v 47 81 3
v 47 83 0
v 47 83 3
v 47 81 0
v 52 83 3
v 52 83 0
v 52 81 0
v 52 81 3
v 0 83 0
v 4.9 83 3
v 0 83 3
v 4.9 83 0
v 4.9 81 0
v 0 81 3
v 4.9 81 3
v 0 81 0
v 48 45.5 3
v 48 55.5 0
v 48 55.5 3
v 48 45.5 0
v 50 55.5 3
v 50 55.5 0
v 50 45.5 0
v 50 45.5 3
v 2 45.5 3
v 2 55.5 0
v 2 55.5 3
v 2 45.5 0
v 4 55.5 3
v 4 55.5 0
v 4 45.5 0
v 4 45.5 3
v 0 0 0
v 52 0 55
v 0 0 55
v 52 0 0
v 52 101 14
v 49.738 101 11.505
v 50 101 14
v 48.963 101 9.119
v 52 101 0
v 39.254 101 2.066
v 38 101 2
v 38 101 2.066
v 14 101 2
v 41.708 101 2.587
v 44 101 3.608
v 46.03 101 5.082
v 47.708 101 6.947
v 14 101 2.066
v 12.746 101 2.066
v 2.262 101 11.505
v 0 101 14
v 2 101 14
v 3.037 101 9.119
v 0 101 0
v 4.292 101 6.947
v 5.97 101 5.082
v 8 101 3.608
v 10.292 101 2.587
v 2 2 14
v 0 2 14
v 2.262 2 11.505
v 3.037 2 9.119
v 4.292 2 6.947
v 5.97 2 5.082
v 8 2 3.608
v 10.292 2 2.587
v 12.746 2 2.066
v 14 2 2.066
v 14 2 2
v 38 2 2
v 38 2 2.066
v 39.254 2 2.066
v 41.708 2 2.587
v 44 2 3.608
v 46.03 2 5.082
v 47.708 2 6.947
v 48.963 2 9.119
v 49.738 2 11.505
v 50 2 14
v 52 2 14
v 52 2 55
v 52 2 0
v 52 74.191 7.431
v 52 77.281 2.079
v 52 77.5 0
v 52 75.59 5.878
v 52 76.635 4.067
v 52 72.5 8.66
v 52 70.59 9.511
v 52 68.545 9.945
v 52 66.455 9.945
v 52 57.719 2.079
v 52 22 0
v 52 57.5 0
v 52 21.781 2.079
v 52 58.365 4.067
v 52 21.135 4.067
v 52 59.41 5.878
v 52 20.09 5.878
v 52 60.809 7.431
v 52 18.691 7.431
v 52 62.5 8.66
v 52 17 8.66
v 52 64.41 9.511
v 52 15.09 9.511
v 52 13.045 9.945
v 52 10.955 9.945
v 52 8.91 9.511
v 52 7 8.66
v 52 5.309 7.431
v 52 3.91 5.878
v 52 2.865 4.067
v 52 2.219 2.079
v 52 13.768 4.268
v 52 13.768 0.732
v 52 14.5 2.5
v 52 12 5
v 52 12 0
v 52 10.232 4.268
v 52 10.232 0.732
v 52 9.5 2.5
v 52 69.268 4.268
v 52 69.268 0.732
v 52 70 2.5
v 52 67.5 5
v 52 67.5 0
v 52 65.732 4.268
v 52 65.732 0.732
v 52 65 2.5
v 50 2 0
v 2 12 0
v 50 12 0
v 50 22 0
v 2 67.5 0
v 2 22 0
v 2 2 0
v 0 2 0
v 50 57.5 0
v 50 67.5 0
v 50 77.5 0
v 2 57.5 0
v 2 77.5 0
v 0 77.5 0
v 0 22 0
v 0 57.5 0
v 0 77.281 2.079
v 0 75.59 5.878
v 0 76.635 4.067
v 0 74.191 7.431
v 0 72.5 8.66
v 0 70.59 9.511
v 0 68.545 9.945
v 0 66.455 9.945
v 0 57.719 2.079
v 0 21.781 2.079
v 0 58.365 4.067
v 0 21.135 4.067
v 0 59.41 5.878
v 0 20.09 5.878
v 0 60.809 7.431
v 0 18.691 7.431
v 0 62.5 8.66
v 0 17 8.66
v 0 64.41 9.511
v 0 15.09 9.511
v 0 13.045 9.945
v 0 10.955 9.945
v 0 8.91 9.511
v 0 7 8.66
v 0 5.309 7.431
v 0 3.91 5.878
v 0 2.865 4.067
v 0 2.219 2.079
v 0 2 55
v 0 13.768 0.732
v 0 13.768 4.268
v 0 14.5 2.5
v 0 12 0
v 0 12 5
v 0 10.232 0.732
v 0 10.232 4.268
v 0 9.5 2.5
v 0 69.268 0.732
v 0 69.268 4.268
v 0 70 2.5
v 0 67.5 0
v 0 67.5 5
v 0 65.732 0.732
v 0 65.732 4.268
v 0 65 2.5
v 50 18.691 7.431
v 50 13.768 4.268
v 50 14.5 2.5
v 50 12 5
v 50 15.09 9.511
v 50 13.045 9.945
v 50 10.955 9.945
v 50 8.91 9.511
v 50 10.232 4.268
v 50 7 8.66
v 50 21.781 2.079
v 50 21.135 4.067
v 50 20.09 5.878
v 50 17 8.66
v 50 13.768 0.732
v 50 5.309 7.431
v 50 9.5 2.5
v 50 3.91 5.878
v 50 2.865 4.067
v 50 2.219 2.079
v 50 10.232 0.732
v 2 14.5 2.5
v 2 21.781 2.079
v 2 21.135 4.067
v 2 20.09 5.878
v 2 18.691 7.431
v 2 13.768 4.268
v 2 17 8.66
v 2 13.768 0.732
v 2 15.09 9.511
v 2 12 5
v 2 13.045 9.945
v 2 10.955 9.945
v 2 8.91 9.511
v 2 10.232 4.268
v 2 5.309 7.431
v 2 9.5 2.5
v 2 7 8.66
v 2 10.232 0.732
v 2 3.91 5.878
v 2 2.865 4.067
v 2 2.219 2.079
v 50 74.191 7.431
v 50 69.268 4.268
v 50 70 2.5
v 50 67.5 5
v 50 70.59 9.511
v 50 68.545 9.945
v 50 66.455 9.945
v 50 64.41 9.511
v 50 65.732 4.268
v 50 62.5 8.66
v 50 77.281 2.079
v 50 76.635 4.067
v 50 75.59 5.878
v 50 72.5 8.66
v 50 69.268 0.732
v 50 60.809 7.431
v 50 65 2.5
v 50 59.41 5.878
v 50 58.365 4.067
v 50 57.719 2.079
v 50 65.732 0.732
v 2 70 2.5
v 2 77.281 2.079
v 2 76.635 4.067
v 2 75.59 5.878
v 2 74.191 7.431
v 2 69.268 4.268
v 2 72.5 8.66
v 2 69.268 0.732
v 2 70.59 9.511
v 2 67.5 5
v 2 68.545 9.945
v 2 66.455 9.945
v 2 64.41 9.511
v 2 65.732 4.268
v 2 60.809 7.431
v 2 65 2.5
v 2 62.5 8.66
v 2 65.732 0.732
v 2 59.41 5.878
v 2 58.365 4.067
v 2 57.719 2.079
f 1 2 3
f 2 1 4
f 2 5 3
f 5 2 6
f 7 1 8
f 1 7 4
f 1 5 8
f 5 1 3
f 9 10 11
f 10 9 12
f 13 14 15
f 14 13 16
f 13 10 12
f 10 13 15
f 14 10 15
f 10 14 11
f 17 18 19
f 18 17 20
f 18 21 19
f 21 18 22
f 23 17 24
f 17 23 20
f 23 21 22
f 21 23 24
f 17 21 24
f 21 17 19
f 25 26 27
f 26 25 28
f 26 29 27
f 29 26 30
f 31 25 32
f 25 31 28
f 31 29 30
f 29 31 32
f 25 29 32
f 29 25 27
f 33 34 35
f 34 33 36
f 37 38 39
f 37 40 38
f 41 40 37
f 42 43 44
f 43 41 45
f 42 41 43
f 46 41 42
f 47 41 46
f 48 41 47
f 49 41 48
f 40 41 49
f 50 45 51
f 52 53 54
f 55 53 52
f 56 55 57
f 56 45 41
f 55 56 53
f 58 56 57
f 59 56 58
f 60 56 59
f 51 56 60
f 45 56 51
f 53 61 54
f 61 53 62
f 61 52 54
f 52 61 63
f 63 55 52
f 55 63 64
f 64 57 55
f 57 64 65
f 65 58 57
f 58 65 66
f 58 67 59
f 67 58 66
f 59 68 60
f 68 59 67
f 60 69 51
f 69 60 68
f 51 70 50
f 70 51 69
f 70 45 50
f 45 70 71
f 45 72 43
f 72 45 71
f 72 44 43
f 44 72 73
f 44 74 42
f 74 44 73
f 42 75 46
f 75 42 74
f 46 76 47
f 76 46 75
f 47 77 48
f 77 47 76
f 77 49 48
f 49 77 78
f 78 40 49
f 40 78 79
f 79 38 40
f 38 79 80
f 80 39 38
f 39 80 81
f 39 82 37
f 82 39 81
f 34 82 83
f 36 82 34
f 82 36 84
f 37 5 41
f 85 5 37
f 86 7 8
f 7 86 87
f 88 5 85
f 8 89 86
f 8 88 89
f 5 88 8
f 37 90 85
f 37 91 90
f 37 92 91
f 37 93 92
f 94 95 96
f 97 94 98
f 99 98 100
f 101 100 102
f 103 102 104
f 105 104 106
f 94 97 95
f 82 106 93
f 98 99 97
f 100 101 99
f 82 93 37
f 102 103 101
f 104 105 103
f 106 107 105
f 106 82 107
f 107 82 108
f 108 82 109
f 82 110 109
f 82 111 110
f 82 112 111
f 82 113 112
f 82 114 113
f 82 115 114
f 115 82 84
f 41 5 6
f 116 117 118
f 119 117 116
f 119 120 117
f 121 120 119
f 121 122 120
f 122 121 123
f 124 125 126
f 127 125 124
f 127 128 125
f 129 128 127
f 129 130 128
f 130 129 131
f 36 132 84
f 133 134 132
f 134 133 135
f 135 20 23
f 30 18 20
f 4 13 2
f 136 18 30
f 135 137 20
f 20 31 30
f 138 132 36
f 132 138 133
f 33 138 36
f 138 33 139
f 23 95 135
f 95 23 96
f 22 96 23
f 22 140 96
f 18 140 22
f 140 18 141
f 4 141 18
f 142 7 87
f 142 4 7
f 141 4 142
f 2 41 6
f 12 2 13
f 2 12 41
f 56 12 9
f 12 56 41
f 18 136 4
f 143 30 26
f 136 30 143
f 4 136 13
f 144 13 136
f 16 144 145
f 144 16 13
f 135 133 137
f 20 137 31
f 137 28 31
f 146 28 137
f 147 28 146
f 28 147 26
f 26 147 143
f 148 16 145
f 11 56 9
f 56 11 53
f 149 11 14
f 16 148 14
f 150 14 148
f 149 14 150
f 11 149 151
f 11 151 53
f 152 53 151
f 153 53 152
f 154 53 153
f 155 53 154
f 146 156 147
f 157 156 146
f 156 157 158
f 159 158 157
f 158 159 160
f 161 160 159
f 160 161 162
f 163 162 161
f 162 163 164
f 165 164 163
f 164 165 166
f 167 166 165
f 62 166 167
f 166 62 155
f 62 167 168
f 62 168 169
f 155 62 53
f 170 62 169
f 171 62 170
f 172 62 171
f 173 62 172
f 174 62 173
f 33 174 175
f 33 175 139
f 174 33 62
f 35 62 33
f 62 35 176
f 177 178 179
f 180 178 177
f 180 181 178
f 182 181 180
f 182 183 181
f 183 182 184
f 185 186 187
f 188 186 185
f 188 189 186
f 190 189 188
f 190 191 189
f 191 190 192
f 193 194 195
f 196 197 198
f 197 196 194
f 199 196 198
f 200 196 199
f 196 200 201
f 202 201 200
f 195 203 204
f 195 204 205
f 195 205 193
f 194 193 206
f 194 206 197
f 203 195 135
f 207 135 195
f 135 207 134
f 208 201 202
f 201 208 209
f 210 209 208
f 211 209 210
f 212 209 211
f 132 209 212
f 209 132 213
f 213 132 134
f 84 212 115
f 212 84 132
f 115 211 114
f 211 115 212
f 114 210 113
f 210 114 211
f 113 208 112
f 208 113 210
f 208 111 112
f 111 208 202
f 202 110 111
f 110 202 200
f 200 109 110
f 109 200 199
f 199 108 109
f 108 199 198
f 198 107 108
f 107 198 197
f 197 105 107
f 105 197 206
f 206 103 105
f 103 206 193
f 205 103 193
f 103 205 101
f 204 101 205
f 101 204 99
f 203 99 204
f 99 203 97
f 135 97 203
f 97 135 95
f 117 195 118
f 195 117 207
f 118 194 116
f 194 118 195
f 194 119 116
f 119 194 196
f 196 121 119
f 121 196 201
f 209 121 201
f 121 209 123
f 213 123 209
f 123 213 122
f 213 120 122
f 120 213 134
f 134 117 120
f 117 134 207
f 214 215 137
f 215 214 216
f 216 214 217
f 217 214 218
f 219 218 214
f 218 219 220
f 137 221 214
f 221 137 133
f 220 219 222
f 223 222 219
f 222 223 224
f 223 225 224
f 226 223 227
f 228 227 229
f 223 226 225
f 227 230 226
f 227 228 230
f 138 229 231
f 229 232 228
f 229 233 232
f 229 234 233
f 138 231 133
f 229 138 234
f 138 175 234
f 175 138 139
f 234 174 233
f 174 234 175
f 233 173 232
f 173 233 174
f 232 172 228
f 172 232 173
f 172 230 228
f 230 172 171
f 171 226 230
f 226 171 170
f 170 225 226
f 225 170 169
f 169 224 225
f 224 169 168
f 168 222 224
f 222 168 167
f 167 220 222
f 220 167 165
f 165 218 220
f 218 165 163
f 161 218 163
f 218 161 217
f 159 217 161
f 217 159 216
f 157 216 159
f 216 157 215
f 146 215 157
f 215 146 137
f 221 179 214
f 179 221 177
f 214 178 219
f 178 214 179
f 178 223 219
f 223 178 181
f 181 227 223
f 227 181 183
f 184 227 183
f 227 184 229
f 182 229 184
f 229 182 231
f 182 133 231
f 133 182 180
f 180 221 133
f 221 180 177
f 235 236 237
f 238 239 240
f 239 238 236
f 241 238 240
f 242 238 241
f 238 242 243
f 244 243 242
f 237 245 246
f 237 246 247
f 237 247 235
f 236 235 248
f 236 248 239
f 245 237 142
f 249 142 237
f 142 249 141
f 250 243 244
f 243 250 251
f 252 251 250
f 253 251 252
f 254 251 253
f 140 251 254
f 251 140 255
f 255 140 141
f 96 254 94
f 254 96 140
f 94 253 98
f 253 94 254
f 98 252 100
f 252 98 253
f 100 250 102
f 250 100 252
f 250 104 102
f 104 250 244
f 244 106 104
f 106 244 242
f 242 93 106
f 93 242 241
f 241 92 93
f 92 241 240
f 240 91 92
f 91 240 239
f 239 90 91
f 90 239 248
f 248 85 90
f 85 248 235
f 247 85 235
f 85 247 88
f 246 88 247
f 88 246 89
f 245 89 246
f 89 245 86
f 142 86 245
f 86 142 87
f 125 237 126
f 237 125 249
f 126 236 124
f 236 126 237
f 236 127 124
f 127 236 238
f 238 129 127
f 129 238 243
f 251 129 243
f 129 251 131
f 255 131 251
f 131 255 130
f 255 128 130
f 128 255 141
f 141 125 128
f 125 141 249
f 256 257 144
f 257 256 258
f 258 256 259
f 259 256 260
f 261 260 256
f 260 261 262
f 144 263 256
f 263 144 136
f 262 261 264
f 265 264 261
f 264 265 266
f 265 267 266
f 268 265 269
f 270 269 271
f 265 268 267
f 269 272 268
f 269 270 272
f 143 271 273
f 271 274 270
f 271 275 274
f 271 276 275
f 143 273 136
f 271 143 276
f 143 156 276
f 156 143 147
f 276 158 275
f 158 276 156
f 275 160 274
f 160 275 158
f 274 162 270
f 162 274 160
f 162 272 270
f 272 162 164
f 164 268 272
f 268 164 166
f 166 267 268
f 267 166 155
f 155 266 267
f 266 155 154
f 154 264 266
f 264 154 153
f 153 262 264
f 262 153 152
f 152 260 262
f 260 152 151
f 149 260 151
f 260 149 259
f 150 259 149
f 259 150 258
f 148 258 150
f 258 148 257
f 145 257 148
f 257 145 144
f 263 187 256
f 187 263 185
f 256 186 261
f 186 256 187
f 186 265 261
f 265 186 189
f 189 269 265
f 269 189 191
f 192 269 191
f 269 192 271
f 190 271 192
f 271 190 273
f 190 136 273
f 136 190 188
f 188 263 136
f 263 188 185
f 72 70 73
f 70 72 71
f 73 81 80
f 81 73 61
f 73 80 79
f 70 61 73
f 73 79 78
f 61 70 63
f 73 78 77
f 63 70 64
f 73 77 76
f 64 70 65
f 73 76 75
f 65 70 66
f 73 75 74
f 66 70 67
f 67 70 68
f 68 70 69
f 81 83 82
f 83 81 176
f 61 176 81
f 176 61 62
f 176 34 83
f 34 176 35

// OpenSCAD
// file: ../jars/jar-rectangular-99x48.scad
function jar_height() = 99; // millimeters
function jar_width() = 48;
function jar_round_edge_radius() = 12;

module jar() {
    linear_extrude(height = jar_height())
    hull() {
        translate([jar_round_edge_radius(), jar_round_edge_radius()]) circle(r = jar_round_edge_radius());
        translate([jar_width() - jar_round_edge_radius(), jar_round_edge_radius()]) circle(r = jar_round_edge_radius());
        translate([jar_width() - jar_round_edge_radius(), jar_width() - jar_round_edge_radius()]) circle(r = jar_round_edge_radius());
        translate([jar_round_edge_radius(), jar_width() - jar_round_edge_radius()]) circle(r = jar_round_edge_radius());
    }
}

jar();
// file: ../drawers/drawer-780x470x255.scad
// These are the usable inner dimension of the drawer.
function drawer_inner_depth() = 471; // millimeters
function drawer_inner_width() = 780;
function drawer_inner_front_height() = 255;
function drawer_inner_back_height() = 160;
function drawer_inner_height() = max(drawer_inner_front_height(), drawer_inner_back_height());

function drawer_side_wall_thickness() = 15; // Does not matter in regards to usable space

module drawer_bottom() {
    width = drawer_inner_width() + 2* drawer_side_wall_thickness();
    height = drawer_side_wall_thickness();
    depth = drawer_inner_depth() + 2* drawer_side_wall_thickness();

    // make the innner space of the drawer aligned with coordinates [0,0,0]
    offset_x = -drawer_side_wall_thickness();
    offset_y = -drawer_side_wall_thickness();
    offset_z = -drawer_side_wall_thickness();

    translate([offset_x, offset_y, offset_z]) cube([width, depth, height]);
}

module drawer_front() {
    width = drawer_inner_width() + 2* drawer_side_wall_thickness();
    height = drawer_inner_height();
    depth = drawer_side_wall_thickness();

    offset_x = -drawer_side_wall_thickness();
    offset_y = -drawer_side_wall_thickness();
    offset_z = -drawer_side_wall_thickness();

    handle_width = 160;
    handle_depth = 20;
    handle_height = 20;

    // make the innner space of the drawer aligned with coordinates [0,0,0]
    handle_offset_x = offset_x + width / 2 - handle_width / 2;
    handle_offset_y = offset_y - handle_depth;
    handle_offset_z = offset_z + height / 2 - handle_height / 2;

    union() {
        // front panel
        translate([offset_x, offset_y, offset_z]) cube([width, depth, height]);
        translate([handle_offset_x, handle_offset_y, handle_offset_z]) {
            cube([handle_width, handle_depth, handle_height]);
        }
    }
}

module drawer_side(s = "left") {
    width = drawer_side_wall_thickness();
    height = drawer_inner_height();
    depth = drawer_inner_depth() + 2* drawer_side_wall_thickness();

    offset_y = -drawer_side_wall_thickness();
    offset_z = -drawer_side_wall_thickness();
    if (s == "right") {
        offset_x = drawer_inner_width() + drawer_side_wall_thickness();
        translate([offset_x, offset_y, offset_z]) cube([width, depth, height]);
    } else {
        offset_x = -drawer_side_wall_thickness();
        translate([offset_x, offset_y, offset_z]) cube([width, depth, height]);
    }
}

module drawer_back() {
    width = drawer_inner_width() + 2* drawer_side_wall_thickness();
    height = drawer_inner_back_height();
    depth = drawer_side_wall_thickness();

    offset_x = -drawer_side_wall_thickness();
    offset_y = drawer_inner_depth();
    offset_z = -drawer_side_wall_thickness();

    translate([offset_x, offset_y, offset_z]) cube([width, depth, height]);
}

module drawer() {
    union() {
        drawer_bottom();
        drawer_front();
        drawer_side(s = "left");
        drawer_side(s = "right");
        drawer_back();
    }
}

drawer();
// file: organizer-drawer_780x470x255-jar_99x48.scad
use <../drawers/drawer-780x470x255.scad>;
use <../jars/jar-rectangular-99x48.scad>;

function side_wall_minimum_thickness() = 2;
function foot_wall_minimum_thickness() = side_wall_minimum_thickness();
function organizer_width() = jar_width() + side_wall_minimum_thickness() * 2;
function side_length() = jar_height() + side_wall_minimum_thickness();
function side_height() = jar_round_edge_radius();

function row_attachment_slot_length() = 10;
function row_attachment_slot_width() = 2;
function row_attachment_slot_depth() = 3;
function row_attachment_distance_from_edge() = 2;

module row_attachment_slot() {
    diff_workaround = 0.1;

    offset_x = row_attachment_distance_from_edge();
    offset_y = - diff_workaround;
    offset_z = side_length() / 2 - row_attachment_slot_length() / 2;
    depth = row_attachment_slot_depth() + diff_workaround;

    translate([offset_x, offset_y, offset_z]) cube([row_attachment_slot_width(), depth, row_attachment_slot_length()]);

    other_side_offset_x = organizer_width() - row_attachment_distance_from_edge() - row_attachment_slot_width();
    translate([other_side_offset_x, offset_y, offset_z]) cube([row_attachment_slot_width(), depth, row_attachment_slot_length()]);
}

function row_attachment_pin_wall_thickness() = side_wall_minimum_thickness();
function row_attachment_pin_loose_fit() = 0.05;
function row_attachment_pin_length_loose_fit() = 1.0;
function row_attachment_pin_width() = row_attachment_distance_from_edge() * 4 - row_attachment_pin_loose_fit();

module row_attachment_pin() {
    length = row_attachment_slot_length() - row_attachment_pin_length_loose_fit();
    depth = row_attachment_slot_depth() - row_attachment_pin_loose_fit();
    width = row_attachment_slot_width() - row_attachment_pin_loose_fit();

    linear_extrude(length) {
        union() {
            square([row_attachment_pin_width(), row_attachment_pin_wall_thickness()]);
            translate([0, - depth]) square([width, depth]);
            translate([row_attachment_pin_width() - width, - depth]) square([width, depth]);
        }
    }
}

// aligned with the actual organizer row attachment slot for easier previewing
module row_attachment_pin_aligned() {
    pin_offset_x = organizer_width() - row_attachment_pin_width() / 2 - side_wall_minimum_thickness();
    pin_offset_y = organizer_width() - row_attachment_pin_wall_thickness();
    pin_offset_z = side_length() / 2 - row_attachment_slot_length() / 2 - foot_wall_minimum_thickness();
    translate([pin_offset_x, pin_offset_y, pin_offset_z])
        row_attachment_pin();
}

function vertical_console_slot_depth() = 2;
function vertical_console_slot_diff_workaround() = 0.1;
function vertical_console_shaft_diameter() = 5;
function vertical_console_shaft_distance_from_edge() = 0;
function vertical_console_shaft_minimum_clearance() = 5;
function vertical_console_shaft_cutaway_radius() = vertical_console_shaft_distance_from_edge() + vertical_console_shaft_diameter() + vertical_console_shaft_minimum_clearance();

module vertical_console_cutaway() {
    shaft_offset_y = vertical_console_shaft_distance_from_edge() + vertical_console_shaft_diameter() / 2;
    diff_workaround = 0.1;

    rotate([0, 90, 0])
    linear_extrude(vertical_console_slot_depth() + diff_workaround)
    difference() {
        circle(r = vertical_console_shaft_cutaway_radius());
        translate([0, shaft_offset_y]) circle(d = vertical_console_shaft_diameter());
        translate([0, - vertical_console_shaft_cutaway_radius() - diff_workaround]) square(vertical_console_shaft_cutaway_radius() * 2, center = true);
    }
}

function column_attachment_slot_width() = 5;
function column_attachment_slot_depth() = 3;
function column_attachment_pin_loose_fit() = 0.05;
function vertical_console_cutaway_row_attachment_slont_clearance() = 2;

function vertical_console_row_1_slot_offset_z() = vertical_console_shaft_cutaway_radius() + vertical_console_cutaway_row_attachment_slont_clearance();
function vertical_console_row_2_slot_offset_z() = side_length() / 2 + vertical_console_shaft_cutaway_radius() + row_attachment_slot_length() / 2 + vertical_console_cutaway_row_attachment_slont_clearance();
function vertical_console_side_a_offset_x() = - vertical_console_slot_diff_workaround();
function vertical_console_side_b_offset_x() = organizer_width() - vertical_console_slot_depth();

module organizer_side(ol = 0) {
    diff_workaround = vertical_console_slot_diff_workaround();

    difference() {
        linear_extrude(side_length())
        difference() {
            square([organizer_width(), side_height() + side_wall_minimum_thickness()]);
            translate([jar_round_edge_radius() + side_wall_minimum_thickness(), jar_round_edge_radius() + side_wall_minimum_thickness()])circle(jar_round_edge_radius());
            translate([jar_width() - jar_round_edge_radius() + side_wall_minimum_thickness(), jar_round_edge_radius() + side_wall_minimum_thickness()])circle(jar_round_edge_radius());
            translate([side_wall_minimum_thickness() + jar_round_edge_radius(), side_wall_minimum_thickness()]) square([jar_width() - 2 * jar_round_edge_radius(), side_height()]);
        }

        if (ol > 0) {
            offset_z = side_length() - ol - foot_wall_minimum_thickness();
            translate([- diff_workaround, - diff_workaround, offset_z]) cube([column_attachment_slot_width() + diff_workaround, column_attachment_slot_depth() + diff_workaround, foot_wall_minimum_thickness()]);

            offset_x = organizer_width() - column_attachment_slot_width() + diff_workaround;
            translate([offset_x, - diff_workaround, offset_z]) cube([column_attachment_slot_width() + diff_workaround, column_attachment_slot_depth() + diff_workaround, foot_wall_minimum_thickness()]);
        }

        row_attachment_slot();
        translate([vertical_console_side_a_offset_x(), 0, vertical_console_row_1_slot_offset_z()]) vertical_console_cutaway();
        translate([vertical_console_side_b_offset_x(), 0, vertical_console_row_1_slot_offset_z()]) vertical_console_cutaway();

        translate([vertical_console_side_a_offset_x(), 0, vertical_console_row_2_slot_offset_z()]) vertical_console_cutaway();
        translate([vertical_console_side_b_offset_x(), 0, vertical_console_row_2_slot_offset_z()]) vertical_console_cutaway();
    }
}

module organizer_foot(lf = 0, ol = 0, fp = false) {
    pin_width = column_attachment_slot_width() - column_attachment_pin_loose_fit();
    pin_depth = column_attachment_slot_depth() - column_attachment_pin_loose_fit();
    pin_thickness = foot_wall_minimum_thickness() - column_attachment_pin_loose_fit();

    pin_offset_y = organizer_width() + lf;
    pin_offset_x = organizer_width() - pin_width;
    pin_offset_z = column_attachment_pin_loose_fit() / 2;

    union() {
        cube([organizer_width(), organizer_width() + lf, foot_wall_minimum_thickness()]);
        if (fp) {
            translate([0, pin_offset_y, pin_offset_z]) cube([pin_width, pin_depth, pin_thickness]);
            translate([pin_offset_x, pin_offset_y, pin_offset_z]) cube([pin_width, pin_depth, pin_thickness]);
        }
    }
}

module organizer(
    ol = 0, // overlap - used to determine where the foot of the next organizer will attach to the side of the current one
    lf = 0, // loose fit - distance between two organizers so it is easy to slide in jar into overlapping organizers
    fp = false, // add attachment pins to foot
) {
    translate([jar_width() + side_wall_minimum_thickness(), jar_width() + side_wall_minimum_thickness(), -side_wall_minimum_thickness()])
    rotate([0, 0, 180])
    difference() {
        union() {
            organizer_side(ol);
            organizer_foot(lf = lf, ol = ol, fp = fp);
        }
    }
}

translate([side_wall_minimum_thickness(), foot_wall_minimum_thickness(), organizer_width() - side_wall_minimum_thickness()])
rotate([-90, 0, 0])
organizer(lf = 3, ol = 18, fp = true);
// main file
use <organizer-drawer_780x470x255-jar_99x48.scad>;

translate([side_wall_minimum_thickness(), foot_wall_minimum_thickness(), organizer_width() - side_wall_minimum_thickness()])
rotate([-90, 0, 0])
organizer(lf = 3, ol = 18, fp = false);
